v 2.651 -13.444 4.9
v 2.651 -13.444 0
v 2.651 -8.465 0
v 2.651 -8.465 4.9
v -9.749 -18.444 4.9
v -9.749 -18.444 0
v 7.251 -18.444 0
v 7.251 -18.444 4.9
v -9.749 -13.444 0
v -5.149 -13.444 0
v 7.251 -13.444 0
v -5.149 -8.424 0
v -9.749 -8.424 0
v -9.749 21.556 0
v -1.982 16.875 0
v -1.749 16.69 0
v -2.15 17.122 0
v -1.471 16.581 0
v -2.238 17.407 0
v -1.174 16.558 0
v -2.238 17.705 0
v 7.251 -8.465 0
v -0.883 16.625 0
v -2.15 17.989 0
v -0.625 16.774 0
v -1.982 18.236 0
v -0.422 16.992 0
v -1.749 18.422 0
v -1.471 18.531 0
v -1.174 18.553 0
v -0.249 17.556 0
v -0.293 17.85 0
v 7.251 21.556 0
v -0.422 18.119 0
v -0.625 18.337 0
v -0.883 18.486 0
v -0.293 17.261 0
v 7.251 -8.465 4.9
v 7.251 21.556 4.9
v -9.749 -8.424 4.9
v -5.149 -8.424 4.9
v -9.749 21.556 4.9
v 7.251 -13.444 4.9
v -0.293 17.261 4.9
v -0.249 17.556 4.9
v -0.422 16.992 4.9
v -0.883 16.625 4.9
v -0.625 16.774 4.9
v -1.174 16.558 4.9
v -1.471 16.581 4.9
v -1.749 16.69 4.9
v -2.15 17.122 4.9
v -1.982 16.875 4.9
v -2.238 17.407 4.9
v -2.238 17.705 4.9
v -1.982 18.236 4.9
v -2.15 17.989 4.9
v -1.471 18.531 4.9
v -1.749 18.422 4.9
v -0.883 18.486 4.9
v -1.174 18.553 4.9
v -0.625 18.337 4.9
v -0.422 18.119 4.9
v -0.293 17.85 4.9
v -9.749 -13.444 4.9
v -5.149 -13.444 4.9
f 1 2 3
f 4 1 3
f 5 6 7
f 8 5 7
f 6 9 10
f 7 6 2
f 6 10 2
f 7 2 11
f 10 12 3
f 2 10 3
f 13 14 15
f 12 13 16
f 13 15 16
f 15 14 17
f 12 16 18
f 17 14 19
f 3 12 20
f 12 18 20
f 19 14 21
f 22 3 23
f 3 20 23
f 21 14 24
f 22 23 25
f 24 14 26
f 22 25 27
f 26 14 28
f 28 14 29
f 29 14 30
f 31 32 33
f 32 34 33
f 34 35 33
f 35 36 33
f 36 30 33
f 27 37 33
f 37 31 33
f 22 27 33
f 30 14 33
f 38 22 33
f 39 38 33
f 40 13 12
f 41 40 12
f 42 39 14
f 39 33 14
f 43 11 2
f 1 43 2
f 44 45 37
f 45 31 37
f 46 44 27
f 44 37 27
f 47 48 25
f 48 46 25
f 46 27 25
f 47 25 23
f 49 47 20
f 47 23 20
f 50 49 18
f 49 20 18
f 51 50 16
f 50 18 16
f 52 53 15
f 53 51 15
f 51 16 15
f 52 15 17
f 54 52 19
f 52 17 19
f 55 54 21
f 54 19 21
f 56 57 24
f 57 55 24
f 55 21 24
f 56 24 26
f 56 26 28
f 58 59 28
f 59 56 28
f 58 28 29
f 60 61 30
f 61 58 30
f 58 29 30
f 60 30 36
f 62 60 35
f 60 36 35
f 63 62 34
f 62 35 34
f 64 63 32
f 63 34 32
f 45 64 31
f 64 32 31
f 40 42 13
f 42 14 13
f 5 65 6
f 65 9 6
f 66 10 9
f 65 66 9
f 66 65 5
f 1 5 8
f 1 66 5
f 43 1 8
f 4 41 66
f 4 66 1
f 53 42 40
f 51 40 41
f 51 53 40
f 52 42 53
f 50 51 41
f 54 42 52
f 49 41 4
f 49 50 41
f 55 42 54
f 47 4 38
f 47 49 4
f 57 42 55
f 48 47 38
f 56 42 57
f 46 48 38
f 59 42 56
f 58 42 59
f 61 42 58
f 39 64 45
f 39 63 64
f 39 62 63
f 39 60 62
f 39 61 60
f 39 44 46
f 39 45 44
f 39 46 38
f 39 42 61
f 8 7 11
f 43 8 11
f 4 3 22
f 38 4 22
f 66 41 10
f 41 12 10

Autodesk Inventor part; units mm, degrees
ref_plane "YZ Plane" through (0, 0, 0) normal (1, 0, 0) x (0, 1, 0)
ref_plane "XZ Plane" through (0, 0, 0) normal (0, 1, 0) x (-1, 0, 0)
ref_plane "XY Plane" through (0, 0, 0) normal (0, 0, 1) x (1, 0, 0)
sketch "Эскиз1" plane through (0, 0, 0) normal (0, 0, 1) x (1, 0, 0)
  line L0 (-5.1487, -13.4444) -> (-9.7487, -13.4444)
  line L1 (-9.7487, -13.4444) -> (-9.7487, -18.4444)
  line L2 (-9.7487, -18.4444) -> (7.2513, -18.4444)
  line L3 (7.2513, -18.4444) -> (7.2513, -13.4444)
  line L4 (7.2513, -13.4444) -> (2.6513, -13.4444)
  line L5 (2.6513, -13.4444) -> (2.6513, -8.4651)
  line L6 (2.6513, -8.4651) -> (7.2513, -8.4651)
  line L7 (7.2513, -8.4651) -> (7.2513, 21.5556)
  line L8 (7.2513, 21.5556) -> (-9.7487, 21.5556)
  line L9 (-9.7487, 21.5556) -> (-9.7487, -8.4237)
  line L10 (-9.7487, -8.4237) -> (-5.1487, -8.4237)
  line L11 (-5.1487, -8.4237) -> (-5.1487, -13.4444)
  circle A0 centre (-1.2487, 17.5556) radius 1
extrude "Выдавливание1" add sketch "Эскиз1" along normal blind 4.9
properties part number "В. шарн. - держатель смартфона"
